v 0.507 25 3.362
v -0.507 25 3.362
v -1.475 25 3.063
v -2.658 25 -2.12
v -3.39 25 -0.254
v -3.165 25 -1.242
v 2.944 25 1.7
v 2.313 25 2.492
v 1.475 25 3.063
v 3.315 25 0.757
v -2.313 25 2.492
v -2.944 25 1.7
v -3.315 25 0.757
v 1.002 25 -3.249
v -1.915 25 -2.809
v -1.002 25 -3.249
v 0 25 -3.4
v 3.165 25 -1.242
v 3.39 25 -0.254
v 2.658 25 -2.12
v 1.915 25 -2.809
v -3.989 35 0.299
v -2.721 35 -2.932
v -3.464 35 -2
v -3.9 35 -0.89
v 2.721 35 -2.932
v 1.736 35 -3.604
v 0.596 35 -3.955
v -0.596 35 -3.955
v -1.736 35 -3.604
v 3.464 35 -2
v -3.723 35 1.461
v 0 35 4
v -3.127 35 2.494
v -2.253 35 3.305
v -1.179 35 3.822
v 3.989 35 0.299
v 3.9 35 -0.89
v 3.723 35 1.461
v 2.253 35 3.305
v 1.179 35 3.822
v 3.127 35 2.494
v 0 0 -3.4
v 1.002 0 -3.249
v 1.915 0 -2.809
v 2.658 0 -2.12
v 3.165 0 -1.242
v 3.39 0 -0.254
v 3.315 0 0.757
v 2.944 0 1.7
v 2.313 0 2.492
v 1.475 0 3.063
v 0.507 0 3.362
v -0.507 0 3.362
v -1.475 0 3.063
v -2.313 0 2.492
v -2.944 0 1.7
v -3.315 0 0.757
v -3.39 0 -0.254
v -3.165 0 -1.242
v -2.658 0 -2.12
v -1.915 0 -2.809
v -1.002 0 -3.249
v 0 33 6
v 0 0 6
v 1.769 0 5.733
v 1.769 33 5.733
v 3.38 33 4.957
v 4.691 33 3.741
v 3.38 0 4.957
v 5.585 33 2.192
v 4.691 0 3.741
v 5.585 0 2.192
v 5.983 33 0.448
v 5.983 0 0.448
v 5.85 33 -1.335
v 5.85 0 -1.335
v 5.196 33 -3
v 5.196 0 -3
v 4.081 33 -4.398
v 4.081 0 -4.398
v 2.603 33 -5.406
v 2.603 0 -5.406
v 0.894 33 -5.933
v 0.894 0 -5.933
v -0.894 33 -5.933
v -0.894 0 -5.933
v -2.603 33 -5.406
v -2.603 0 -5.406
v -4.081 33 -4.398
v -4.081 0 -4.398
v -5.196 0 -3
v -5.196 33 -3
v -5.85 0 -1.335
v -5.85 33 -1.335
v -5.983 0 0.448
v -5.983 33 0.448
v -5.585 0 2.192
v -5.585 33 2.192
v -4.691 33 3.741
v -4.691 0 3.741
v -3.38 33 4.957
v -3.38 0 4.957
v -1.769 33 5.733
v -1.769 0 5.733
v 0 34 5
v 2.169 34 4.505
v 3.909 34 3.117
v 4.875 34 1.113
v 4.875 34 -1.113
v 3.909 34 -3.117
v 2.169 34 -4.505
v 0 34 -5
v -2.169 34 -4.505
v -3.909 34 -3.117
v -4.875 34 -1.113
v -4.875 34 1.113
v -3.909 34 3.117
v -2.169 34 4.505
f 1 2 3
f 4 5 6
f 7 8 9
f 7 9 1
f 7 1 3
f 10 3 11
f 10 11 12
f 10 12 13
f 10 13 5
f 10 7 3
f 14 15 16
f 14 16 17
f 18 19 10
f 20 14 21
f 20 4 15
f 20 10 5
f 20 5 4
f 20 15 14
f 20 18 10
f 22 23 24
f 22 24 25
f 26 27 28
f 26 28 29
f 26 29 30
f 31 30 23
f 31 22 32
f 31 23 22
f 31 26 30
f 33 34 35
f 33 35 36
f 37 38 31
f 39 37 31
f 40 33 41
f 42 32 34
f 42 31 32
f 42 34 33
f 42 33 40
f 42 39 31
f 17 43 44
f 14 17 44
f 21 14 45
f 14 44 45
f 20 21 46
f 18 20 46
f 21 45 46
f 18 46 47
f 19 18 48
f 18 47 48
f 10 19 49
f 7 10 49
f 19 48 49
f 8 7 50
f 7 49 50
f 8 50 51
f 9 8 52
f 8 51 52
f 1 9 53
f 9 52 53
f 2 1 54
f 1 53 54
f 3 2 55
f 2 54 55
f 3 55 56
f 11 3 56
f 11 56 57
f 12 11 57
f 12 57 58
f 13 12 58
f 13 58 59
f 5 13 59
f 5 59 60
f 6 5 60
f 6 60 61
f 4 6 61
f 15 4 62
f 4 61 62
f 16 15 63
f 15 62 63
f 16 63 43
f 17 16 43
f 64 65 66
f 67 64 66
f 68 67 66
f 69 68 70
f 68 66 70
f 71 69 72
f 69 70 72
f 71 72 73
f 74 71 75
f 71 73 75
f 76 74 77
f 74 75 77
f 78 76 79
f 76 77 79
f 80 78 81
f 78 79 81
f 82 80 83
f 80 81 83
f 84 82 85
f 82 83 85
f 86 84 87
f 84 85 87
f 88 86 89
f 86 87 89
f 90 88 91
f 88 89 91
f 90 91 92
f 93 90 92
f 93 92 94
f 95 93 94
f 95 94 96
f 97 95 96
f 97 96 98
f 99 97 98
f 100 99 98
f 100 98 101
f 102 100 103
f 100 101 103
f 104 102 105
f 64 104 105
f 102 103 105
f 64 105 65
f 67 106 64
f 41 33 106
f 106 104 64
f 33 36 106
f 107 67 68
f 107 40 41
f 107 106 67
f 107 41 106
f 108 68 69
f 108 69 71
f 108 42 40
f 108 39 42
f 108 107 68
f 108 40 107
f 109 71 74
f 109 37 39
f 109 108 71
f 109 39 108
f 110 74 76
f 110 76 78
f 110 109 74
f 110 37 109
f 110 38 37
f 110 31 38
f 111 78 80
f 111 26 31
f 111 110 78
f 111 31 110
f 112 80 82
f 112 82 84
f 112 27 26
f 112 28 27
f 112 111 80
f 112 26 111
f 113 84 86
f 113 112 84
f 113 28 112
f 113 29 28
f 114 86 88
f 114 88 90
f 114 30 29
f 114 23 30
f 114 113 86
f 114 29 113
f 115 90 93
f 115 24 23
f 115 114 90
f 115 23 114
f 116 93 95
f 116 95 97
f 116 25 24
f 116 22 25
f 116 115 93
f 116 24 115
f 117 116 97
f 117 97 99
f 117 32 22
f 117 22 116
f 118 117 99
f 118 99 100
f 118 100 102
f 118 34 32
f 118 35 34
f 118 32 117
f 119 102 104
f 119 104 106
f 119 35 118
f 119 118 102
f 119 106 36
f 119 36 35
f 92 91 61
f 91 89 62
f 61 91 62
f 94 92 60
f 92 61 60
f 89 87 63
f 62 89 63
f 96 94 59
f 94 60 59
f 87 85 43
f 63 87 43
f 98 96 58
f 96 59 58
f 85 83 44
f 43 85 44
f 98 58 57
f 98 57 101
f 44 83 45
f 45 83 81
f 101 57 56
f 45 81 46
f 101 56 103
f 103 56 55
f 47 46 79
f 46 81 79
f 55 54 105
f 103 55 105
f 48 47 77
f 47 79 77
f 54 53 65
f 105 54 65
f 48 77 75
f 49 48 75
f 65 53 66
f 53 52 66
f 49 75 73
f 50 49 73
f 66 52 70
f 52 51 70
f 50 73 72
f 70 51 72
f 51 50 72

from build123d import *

# Parameters (mm, degrees)
ESBO_O1_R                = 6
RESSALTO_EXTRUS_O1_DEPTH = 35
CHANFRO1_SIZE            = 2
ESBO_O2_R                = 3.4
CORTE_EXTRUS_O1_DEPTH    = 25


with BuildPart() as part:
    # Esboço1 → Ressalto-extrusão1 (new body)
    with BuildSketch(Plane(origin=(0, 0, 0), x_dir=(1, 0, 0), z_dir=(0, 1, 0))):
        with Locations(Location((0, 0, 0), (0, 0, 270))):
            Circle(ESBO_O1_R)
    extrude(amount=RESSALTO_EXTRUS_O1_DEPTH)

    # Chanfro1
    chanfro1_edges = [part.edges().sort_by_distance(p)[0] for p in [
        (0, 35, -6),
    ]]
    chamfer(chanfro1_edges, length=CHANFRO1_SIZE)

    # Esboço2 → Corte-extrusão1 (cut)
    with BuildSketch(Plane.XZ):
        with Locations(Location((0, 0, 0), (0, 0, 270))):
            Circle(ESBO_O2_R)
    extrude(amount=-CORTE_EXTRUS_O1_DEPTH, mode=Mode.SUBTRACT)


solid = part.part
